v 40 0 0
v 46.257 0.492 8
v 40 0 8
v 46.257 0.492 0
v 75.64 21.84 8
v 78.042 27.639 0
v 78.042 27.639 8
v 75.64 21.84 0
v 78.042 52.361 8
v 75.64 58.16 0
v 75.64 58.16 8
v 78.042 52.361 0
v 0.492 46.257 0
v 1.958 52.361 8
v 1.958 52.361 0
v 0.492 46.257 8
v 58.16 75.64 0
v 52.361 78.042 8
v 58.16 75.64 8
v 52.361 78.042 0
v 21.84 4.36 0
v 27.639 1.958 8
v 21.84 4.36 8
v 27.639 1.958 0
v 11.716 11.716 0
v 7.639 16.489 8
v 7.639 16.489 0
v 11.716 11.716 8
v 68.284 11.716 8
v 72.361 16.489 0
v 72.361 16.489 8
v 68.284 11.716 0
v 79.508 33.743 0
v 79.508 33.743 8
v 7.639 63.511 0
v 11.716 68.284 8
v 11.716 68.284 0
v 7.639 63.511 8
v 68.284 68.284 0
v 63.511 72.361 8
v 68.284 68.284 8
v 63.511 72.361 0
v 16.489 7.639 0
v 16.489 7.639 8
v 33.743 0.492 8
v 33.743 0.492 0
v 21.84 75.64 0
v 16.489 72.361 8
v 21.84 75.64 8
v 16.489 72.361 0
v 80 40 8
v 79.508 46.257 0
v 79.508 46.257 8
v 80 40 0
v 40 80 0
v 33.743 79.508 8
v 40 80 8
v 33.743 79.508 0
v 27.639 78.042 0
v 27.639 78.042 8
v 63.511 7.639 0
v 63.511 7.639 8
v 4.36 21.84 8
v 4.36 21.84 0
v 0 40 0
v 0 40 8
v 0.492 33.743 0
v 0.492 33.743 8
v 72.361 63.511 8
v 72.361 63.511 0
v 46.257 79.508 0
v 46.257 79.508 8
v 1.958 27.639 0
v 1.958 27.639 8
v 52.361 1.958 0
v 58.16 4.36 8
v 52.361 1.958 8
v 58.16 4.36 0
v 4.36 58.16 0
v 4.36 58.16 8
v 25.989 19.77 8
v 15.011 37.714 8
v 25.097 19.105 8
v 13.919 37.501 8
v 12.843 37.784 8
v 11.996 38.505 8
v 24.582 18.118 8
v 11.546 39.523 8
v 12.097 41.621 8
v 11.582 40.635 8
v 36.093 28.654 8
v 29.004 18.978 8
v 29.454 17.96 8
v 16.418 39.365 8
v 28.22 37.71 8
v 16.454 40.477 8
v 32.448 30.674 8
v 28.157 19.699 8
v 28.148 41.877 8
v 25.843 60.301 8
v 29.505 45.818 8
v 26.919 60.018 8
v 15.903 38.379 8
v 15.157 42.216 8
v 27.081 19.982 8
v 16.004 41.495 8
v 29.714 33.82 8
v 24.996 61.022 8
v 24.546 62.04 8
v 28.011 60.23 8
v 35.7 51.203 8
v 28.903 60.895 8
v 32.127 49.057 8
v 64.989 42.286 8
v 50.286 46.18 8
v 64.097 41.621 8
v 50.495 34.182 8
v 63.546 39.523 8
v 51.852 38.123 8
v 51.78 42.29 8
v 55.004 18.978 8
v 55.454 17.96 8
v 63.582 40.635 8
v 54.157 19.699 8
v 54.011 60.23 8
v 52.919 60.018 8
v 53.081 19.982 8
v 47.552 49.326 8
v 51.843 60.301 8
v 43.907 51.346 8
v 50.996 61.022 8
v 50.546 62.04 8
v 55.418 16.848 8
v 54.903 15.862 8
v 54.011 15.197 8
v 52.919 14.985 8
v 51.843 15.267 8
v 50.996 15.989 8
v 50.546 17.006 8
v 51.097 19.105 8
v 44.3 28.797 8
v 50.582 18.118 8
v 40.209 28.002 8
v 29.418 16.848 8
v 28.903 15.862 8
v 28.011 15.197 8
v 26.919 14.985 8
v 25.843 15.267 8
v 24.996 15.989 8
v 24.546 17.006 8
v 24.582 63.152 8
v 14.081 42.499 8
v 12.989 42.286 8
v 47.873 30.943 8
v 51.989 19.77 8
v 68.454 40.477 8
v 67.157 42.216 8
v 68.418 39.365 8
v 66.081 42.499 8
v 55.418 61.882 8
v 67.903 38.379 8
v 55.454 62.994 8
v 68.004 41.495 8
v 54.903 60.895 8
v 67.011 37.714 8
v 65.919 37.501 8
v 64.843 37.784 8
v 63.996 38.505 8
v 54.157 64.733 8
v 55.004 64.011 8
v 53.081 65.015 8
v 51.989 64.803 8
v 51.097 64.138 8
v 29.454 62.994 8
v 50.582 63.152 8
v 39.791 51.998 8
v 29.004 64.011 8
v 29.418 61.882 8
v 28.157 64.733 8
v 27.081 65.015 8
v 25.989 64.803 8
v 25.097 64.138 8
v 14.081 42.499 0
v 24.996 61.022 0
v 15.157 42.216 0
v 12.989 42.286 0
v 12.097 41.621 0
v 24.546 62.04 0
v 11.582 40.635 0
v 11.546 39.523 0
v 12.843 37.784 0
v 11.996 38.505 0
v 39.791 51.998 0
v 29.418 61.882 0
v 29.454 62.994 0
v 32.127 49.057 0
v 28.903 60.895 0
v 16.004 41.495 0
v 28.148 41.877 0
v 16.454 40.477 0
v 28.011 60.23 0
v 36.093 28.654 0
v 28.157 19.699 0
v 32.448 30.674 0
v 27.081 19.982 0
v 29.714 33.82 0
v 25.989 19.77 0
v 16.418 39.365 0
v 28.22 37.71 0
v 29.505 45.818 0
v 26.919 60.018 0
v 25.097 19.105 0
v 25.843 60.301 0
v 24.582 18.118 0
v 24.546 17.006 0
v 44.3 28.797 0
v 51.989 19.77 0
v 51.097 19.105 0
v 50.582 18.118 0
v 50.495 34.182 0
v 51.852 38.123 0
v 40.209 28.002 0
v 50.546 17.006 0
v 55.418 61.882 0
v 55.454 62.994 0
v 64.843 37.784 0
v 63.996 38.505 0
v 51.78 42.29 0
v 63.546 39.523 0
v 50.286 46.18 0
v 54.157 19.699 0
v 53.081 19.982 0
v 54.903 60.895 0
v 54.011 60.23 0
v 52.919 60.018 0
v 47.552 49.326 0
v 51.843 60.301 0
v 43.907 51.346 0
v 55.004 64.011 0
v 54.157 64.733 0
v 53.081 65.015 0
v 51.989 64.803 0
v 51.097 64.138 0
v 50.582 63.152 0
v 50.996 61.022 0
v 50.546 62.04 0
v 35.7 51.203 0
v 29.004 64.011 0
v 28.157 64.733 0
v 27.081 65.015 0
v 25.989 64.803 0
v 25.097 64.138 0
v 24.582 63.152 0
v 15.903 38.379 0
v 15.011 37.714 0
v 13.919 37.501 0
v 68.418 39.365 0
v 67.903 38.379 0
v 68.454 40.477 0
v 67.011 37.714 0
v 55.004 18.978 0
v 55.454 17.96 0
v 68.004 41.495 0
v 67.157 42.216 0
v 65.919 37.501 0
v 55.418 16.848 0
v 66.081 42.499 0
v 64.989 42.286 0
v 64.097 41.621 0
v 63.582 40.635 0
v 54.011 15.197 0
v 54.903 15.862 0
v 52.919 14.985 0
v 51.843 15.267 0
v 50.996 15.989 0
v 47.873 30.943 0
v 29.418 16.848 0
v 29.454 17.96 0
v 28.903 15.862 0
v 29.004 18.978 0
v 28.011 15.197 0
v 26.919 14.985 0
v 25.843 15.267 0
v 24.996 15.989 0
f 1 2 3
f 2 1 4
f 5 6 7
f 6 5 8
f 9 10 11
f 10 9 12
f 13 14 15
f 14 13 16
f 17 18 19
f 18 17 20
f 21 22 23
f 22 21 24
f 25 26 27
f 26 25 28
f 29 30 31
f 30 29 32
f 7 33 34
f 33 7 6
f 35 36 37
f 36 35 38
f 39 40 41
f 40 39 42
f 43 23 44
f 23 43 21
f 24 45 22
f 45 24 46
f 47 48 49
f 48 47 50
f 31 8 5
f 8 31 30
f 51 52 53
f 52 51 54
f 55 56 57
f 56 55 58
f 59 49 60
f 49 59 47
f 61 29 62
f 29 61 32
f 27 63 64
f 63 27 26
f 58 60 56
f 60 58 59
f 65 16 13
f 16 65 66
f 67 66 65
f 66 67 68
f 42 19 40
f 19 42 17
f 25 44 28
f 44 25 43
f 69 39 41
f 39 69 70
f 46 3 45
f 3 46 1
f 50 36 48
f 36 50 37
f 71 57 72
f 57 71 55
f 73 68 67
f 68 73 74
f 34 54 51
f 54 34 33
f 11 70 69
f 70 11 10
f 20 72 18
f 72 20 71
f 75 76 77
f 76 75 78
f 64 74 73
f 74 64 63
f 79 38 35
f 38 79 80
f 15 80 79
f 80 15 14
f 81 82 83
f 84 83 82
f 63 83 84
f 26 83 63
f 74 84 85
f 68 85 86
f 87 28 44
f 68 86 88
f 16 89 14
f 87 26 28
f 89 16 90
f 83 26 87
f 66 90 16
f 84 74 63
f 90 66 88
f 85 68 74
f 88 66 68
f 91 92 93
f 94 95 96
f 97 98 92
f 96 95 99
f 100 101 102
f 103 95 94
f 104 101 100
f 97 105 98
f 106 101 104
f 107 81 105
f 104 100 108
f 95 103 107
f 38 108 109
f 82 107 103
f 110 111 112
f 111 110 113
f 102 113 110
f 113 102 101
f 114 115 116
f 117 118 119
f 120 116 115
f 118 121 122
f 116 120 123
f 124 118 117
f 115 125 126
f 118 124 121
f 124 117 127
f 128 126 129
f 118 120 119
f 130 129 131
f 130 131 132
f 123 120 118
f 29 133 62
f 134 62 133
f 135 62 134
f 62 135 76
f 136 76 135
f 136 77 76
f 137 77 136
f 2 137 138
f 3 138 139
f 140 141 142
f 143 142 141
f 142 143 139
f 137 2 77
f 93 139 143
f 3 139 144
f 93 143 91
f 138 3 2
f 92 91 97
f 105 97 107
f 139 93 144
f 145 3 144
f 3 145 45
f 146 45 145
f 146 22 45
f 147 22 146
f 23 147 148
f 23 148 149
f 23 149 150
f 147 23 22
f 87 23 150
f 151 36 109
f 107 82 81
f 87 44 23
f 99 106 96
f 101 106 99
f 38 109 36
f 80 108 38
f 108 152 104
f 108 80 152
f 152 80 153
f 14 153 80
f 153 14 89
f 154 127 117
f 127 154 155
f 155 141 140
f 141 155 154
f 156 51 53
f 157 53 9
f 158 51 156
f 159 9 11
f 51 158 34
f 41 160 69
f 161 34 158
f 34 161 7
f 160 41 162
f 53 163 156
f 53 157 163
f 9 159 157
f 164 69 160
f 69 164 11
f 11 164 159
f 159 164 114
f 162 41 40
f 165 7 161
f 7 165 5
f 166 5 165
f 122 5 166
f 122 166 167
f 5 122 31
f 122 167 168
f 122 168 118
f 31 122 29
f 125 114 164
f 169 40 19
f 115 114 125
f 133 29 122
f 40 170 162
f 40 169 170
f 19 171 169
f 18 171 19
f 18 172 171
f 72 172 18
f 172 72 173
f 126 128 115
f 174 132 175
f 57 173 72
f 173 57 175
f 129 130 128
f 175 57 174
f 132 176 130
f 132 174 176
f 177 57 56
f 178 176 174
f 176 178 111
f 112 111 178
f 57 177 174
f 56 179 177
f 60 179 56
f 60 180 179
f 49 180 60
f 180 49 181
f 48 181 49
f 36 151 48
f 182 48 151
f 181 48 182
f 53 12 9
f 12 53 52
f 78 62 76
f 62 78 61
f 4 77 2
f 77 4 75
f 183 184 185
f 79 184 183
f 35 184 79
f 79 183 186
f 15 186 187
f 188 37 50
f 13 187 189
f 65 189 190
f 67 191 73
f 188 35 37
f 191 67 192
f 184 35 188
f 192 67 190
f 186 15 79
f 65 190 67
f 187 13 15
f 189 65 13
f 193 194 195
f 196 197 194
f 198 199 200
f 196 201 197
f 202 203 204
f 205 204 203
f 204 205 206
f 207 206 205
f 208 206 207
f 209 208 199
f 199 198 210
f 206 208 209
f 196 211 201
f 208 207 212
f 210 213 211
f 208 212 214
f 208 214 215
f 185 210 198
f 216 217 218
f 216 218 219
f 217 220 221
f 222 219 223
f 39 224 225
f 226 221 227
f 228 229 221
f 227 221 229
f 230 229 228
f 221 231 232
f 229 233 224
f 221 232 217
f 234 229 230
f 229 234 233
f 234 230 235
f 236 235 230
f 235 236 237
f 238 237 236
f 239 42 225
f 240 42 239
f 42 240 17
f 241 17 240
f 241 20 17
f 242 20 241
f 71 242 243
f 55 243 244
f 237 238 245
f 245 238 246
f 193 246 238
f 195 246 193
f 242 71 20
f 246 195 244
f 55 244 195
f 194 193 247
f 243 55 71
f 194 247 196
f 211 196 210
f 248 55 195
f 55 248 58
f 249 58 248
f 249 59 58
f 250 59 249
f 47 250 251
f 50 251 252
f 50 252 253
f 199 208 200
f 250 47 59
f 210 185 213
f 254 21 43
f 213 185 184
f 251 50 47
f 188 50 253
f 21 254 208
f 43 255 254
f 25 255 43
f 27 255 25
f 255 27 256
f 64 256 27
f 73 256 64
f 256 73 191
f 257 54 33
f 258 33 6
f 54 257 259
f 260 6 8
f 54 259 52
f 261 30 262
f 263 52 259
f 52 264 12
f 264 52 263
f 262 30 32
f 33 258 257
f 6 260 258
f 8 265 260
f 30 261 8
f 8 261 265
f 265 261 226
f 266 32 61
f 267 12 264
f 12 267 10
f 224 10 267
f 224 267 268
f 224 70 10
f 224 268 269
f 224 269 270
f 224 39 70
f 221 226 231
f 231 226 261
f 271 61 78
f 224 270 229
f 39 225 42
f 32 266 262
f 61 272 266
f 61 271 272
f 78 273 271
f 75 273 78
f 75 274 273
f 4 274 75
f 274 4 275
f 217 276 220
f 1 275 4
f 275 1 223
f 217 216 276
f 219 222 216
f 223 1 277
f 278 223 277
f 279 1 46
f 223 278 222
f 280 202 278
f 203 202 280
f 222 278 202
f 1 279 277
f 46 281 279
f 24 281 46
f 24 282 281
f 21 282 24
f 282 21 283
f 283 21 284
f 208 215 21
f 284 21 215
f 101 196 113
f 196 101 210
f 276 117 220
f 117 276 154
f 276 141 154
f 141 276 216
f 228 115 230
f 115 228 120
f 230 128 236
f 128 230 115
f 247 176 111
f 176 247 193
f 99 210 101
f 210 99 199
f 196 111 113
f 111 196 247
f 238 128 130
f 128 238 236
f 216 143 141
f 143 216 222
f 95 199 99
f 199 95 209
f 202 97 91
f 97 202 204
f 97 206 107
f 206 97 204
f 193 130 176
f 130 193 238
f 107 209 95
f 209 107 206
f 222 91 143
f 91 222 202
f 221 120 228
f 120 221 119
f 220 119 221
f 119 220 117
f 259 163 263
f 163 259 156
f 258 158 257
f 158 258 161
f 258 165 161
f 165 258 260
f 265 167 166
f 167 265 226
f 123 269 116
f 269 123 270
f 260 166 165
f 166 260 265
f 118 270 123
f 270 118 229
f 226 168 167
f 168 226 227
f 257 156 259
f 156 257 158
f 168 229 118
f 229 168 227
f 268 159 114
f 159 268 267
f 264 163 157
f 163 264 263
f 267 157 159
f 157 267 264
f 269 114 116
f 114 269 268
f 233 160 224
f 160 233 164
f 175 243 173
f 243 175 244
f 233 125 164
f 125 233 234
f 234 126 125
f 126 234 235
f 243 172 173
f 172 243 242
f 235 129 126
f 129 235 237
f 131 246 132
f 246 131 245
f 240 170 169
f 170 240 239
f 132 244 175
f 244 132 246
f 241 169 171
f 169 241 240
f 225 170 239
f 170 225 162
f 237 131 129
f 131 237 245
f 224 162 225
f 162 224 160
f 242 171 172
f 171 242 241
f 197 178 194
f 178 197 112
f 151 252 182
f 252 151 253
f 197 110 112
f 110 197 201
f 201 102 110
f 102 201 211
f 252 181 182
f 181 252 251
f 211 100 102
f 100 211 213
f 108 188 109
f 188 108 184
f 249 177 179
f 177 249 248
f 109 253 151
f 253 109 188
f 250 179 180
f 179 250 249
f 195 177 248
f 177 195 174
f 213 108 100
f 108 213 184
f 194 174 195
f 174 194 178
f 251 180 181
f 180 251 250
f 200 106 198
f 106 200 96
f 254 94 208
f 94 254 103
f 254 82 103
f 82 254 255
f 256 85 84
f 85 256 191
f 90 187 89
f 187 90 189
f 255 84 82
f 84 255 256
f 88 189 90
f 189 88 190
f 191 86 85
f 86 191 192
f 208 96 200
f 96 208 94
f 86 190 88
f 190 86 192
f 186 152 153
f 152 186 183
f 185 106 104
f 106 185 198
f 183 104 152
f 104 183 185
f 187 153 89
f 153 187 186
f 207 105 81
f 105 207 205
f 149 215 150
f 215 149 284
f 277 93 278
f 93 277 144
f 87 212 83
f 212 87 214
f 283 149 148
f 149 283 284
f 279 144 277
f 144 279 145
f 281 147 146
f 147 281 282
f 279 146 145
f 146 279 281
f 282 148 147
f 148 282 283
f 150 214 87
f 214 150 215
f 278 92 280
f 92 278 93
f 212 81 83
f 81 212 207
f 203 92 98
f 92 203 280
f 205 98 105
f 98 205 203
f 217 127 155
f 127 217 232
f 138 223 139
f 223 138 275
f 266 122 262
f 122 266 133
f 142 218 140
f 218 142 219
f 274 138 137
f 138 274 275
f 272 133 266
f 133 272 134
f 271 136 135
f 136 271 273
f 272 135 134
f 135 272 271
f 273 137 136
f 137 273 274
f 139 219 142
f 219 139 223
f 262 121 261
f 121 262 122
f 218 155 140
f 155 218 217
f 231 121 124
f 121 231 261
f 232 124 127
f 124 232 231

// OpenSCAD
$fn = 32;

// ----------------------------------------------------------------------
// Spacer plate: round flange R40, 6 bolts
// ----------------------------------------------------------------------

// --- parameters (mm) ---
bore_r = 12;              // centre bore radius
bolt_r = 2.5;             // bolt hole radius
plate_t = 8;              // plate thickness, Z (extrusion height)
flange_r = 40;            // flange radius
n_bolt = 6;               // bolt hole count
ring_r = 26;              // bolt circle radius

profile = [[80, 40], [79.508, 46.257], [78.042, 52.361], [75.64, 58.16], [72.361, 63.511], [68.284, 68.284], [63.511, 72.361], [58.16, 75.64], [52.361, 78.042], [46.257, 79.508], [40, 80], [33.743, 79.508], [27.639, 78.042], [21.84, 75.64], [16.489, 72.361], [11.716, 68.284], [7.639, 63.511], [4.36, 58.16], [1.958, 52.361], [0.492, 46.257], [0, 40], [0.492, 33.743], [1.958, 27.639], [4.36, 21.84], [7.639, 16.489], [11.716, 11.716], [16.489, 7.639], [21.84, 4.36], [27.639, 1.958], [33.743, 0.492], [40, 0], [46.257, 0.492], [52.361, 1.958], [58.16, 4.36], [63.511, 7.639], [68.284, 11.716], [72.361, 16.489], [75.64, 21.84], [78.042, 27.639], [79.508, 33.743]];  // primary outline, 40 points, counter clockwise
void_1 = [[51.78, 42.29], [50.286, 46.18], [47.552, 49.326], [43.907, 51.346], [39.791, 51.998], [35.7, 51.203], [32.127, 49.057], [29.505, 45.818], [28.148, 41.877], [28.22, 37.71], [29.714, 33.82], [32.448, 30.674], [36.093, 28.654], [40.209, 28.002], [44.3, 28.797], [47.873, 30.943], [50.495, 34.182], [51.852, 38.123]];  // centre bore, 18 points
void_2 = [[68.454, 40.477], [68.004, 41.495], [67.157, 42.216], [66.081, 42.499], [64.989, 42.286], [64.097, 41.621], [63.582, 40.635], [63.546, 39.523], [63.996, 38.505], [64.843, 37.784], [65.919, 37.501], [67.011, 37.714], [67.903, 38.379], [68.418, 39.365]];  // bolt hole 1, 14 points
void_3 = [[55.454, 62.994], [55.004, 64.011], [54.157, 64.733], [53.081, 65.015], [51.989, 64.803], [51.097, 64.138], [50.582, 63.152], [50.546, 62.04], [50.996, 61.022], [51.843, 60.301], [52.919, 60.018], [54.011, 60.23], [54.903, 60.895], [55.418, 61.882]];  // bolt hole 2, 14 points
void_4 = [[29.454, 62.994], [29.004, 64.011], [28.157, 64.733], [27.081, 65.015], [25.989, 64.803], [25.097, 64.138], [24.582, 63.152], [24.546, 62.04], [24.996, 61.022], [25.843, 60.301], [26.919, 60.018], [28.011, 60.23], [28.903, 60.895], [29.418, 61.882]];  // bolt hole 3, 14 points
void_5 = [[16.454, 40.477], [16.004, 41.495], [15.157, 42.216], [14.081, 42.499], [12.989, 42.286], [12.097, 41.621], [11.582, 40.635], [11.546, 39.523], [11.996, 38.505], [12.843, 37.784], [13.919, 37.501], [15.011, 37.714], [15.903, 38.379], [16.418, 39.365]];  // bolt hole 4, 14 points
void_6 = [[29.454, 17.96], [29.004, 18.978], [28.157, 19.699], [27.081, 19.982], [25.989, 19.77], [25.097, 19.105], [24.582, 18.118], [24.546, 17.006], [24.996, 15.989], [25.843, 15.267], [26.919, 14.985], [28.011, 15.197], [28.903, 15.862], [29.418, 16.848]];  // bolt hole 5, 14 points
void_7 = [[55.454, 17.96], [55.004, 18.978], [54.157, 19.699], [53.081, 19.982], [51.989, 19.77], [51.097, 19.105], [50.582, 18.118], [50.546, 17.006], [50.996, 15.989], [51.843, 15.267], [52.919, 14.985], [54.011, 15.197], [54.903, 15.862], [55.418, 16.848]];  // bolt hole 6, 14 points

// --- the one profile operation ---
difference() {
  linear_extrude(height = plate_t) polygon(points = profile);
  translate([0, 0, -1])
    linear_extrude(height = plate_t + 2) polygon(points = void_1);
  translate([0, 0, -1])
    linear_extrude(height = plate_t + 2) polygon(points = void_2);
  translate([0, 0, -1])
    linear_extrude(height = plate_t + 2) polygon(points = void_3);
  translate([0, 0, -1])
    linear_extrude(height = plate_t + 2) polygon(points = void_4);
  translate([0, 0, -1])
    linear_extrude(height = plate_t + 2) polygon(points = void_5);
  translate([0, 0, -1])
    linear_extrude(height = plate_t + 2) polygon(points = void_6);
  translate([0, 0, -1])
    linear_extrude(height = plate_t + 2) polygon(points = void_7);
}
